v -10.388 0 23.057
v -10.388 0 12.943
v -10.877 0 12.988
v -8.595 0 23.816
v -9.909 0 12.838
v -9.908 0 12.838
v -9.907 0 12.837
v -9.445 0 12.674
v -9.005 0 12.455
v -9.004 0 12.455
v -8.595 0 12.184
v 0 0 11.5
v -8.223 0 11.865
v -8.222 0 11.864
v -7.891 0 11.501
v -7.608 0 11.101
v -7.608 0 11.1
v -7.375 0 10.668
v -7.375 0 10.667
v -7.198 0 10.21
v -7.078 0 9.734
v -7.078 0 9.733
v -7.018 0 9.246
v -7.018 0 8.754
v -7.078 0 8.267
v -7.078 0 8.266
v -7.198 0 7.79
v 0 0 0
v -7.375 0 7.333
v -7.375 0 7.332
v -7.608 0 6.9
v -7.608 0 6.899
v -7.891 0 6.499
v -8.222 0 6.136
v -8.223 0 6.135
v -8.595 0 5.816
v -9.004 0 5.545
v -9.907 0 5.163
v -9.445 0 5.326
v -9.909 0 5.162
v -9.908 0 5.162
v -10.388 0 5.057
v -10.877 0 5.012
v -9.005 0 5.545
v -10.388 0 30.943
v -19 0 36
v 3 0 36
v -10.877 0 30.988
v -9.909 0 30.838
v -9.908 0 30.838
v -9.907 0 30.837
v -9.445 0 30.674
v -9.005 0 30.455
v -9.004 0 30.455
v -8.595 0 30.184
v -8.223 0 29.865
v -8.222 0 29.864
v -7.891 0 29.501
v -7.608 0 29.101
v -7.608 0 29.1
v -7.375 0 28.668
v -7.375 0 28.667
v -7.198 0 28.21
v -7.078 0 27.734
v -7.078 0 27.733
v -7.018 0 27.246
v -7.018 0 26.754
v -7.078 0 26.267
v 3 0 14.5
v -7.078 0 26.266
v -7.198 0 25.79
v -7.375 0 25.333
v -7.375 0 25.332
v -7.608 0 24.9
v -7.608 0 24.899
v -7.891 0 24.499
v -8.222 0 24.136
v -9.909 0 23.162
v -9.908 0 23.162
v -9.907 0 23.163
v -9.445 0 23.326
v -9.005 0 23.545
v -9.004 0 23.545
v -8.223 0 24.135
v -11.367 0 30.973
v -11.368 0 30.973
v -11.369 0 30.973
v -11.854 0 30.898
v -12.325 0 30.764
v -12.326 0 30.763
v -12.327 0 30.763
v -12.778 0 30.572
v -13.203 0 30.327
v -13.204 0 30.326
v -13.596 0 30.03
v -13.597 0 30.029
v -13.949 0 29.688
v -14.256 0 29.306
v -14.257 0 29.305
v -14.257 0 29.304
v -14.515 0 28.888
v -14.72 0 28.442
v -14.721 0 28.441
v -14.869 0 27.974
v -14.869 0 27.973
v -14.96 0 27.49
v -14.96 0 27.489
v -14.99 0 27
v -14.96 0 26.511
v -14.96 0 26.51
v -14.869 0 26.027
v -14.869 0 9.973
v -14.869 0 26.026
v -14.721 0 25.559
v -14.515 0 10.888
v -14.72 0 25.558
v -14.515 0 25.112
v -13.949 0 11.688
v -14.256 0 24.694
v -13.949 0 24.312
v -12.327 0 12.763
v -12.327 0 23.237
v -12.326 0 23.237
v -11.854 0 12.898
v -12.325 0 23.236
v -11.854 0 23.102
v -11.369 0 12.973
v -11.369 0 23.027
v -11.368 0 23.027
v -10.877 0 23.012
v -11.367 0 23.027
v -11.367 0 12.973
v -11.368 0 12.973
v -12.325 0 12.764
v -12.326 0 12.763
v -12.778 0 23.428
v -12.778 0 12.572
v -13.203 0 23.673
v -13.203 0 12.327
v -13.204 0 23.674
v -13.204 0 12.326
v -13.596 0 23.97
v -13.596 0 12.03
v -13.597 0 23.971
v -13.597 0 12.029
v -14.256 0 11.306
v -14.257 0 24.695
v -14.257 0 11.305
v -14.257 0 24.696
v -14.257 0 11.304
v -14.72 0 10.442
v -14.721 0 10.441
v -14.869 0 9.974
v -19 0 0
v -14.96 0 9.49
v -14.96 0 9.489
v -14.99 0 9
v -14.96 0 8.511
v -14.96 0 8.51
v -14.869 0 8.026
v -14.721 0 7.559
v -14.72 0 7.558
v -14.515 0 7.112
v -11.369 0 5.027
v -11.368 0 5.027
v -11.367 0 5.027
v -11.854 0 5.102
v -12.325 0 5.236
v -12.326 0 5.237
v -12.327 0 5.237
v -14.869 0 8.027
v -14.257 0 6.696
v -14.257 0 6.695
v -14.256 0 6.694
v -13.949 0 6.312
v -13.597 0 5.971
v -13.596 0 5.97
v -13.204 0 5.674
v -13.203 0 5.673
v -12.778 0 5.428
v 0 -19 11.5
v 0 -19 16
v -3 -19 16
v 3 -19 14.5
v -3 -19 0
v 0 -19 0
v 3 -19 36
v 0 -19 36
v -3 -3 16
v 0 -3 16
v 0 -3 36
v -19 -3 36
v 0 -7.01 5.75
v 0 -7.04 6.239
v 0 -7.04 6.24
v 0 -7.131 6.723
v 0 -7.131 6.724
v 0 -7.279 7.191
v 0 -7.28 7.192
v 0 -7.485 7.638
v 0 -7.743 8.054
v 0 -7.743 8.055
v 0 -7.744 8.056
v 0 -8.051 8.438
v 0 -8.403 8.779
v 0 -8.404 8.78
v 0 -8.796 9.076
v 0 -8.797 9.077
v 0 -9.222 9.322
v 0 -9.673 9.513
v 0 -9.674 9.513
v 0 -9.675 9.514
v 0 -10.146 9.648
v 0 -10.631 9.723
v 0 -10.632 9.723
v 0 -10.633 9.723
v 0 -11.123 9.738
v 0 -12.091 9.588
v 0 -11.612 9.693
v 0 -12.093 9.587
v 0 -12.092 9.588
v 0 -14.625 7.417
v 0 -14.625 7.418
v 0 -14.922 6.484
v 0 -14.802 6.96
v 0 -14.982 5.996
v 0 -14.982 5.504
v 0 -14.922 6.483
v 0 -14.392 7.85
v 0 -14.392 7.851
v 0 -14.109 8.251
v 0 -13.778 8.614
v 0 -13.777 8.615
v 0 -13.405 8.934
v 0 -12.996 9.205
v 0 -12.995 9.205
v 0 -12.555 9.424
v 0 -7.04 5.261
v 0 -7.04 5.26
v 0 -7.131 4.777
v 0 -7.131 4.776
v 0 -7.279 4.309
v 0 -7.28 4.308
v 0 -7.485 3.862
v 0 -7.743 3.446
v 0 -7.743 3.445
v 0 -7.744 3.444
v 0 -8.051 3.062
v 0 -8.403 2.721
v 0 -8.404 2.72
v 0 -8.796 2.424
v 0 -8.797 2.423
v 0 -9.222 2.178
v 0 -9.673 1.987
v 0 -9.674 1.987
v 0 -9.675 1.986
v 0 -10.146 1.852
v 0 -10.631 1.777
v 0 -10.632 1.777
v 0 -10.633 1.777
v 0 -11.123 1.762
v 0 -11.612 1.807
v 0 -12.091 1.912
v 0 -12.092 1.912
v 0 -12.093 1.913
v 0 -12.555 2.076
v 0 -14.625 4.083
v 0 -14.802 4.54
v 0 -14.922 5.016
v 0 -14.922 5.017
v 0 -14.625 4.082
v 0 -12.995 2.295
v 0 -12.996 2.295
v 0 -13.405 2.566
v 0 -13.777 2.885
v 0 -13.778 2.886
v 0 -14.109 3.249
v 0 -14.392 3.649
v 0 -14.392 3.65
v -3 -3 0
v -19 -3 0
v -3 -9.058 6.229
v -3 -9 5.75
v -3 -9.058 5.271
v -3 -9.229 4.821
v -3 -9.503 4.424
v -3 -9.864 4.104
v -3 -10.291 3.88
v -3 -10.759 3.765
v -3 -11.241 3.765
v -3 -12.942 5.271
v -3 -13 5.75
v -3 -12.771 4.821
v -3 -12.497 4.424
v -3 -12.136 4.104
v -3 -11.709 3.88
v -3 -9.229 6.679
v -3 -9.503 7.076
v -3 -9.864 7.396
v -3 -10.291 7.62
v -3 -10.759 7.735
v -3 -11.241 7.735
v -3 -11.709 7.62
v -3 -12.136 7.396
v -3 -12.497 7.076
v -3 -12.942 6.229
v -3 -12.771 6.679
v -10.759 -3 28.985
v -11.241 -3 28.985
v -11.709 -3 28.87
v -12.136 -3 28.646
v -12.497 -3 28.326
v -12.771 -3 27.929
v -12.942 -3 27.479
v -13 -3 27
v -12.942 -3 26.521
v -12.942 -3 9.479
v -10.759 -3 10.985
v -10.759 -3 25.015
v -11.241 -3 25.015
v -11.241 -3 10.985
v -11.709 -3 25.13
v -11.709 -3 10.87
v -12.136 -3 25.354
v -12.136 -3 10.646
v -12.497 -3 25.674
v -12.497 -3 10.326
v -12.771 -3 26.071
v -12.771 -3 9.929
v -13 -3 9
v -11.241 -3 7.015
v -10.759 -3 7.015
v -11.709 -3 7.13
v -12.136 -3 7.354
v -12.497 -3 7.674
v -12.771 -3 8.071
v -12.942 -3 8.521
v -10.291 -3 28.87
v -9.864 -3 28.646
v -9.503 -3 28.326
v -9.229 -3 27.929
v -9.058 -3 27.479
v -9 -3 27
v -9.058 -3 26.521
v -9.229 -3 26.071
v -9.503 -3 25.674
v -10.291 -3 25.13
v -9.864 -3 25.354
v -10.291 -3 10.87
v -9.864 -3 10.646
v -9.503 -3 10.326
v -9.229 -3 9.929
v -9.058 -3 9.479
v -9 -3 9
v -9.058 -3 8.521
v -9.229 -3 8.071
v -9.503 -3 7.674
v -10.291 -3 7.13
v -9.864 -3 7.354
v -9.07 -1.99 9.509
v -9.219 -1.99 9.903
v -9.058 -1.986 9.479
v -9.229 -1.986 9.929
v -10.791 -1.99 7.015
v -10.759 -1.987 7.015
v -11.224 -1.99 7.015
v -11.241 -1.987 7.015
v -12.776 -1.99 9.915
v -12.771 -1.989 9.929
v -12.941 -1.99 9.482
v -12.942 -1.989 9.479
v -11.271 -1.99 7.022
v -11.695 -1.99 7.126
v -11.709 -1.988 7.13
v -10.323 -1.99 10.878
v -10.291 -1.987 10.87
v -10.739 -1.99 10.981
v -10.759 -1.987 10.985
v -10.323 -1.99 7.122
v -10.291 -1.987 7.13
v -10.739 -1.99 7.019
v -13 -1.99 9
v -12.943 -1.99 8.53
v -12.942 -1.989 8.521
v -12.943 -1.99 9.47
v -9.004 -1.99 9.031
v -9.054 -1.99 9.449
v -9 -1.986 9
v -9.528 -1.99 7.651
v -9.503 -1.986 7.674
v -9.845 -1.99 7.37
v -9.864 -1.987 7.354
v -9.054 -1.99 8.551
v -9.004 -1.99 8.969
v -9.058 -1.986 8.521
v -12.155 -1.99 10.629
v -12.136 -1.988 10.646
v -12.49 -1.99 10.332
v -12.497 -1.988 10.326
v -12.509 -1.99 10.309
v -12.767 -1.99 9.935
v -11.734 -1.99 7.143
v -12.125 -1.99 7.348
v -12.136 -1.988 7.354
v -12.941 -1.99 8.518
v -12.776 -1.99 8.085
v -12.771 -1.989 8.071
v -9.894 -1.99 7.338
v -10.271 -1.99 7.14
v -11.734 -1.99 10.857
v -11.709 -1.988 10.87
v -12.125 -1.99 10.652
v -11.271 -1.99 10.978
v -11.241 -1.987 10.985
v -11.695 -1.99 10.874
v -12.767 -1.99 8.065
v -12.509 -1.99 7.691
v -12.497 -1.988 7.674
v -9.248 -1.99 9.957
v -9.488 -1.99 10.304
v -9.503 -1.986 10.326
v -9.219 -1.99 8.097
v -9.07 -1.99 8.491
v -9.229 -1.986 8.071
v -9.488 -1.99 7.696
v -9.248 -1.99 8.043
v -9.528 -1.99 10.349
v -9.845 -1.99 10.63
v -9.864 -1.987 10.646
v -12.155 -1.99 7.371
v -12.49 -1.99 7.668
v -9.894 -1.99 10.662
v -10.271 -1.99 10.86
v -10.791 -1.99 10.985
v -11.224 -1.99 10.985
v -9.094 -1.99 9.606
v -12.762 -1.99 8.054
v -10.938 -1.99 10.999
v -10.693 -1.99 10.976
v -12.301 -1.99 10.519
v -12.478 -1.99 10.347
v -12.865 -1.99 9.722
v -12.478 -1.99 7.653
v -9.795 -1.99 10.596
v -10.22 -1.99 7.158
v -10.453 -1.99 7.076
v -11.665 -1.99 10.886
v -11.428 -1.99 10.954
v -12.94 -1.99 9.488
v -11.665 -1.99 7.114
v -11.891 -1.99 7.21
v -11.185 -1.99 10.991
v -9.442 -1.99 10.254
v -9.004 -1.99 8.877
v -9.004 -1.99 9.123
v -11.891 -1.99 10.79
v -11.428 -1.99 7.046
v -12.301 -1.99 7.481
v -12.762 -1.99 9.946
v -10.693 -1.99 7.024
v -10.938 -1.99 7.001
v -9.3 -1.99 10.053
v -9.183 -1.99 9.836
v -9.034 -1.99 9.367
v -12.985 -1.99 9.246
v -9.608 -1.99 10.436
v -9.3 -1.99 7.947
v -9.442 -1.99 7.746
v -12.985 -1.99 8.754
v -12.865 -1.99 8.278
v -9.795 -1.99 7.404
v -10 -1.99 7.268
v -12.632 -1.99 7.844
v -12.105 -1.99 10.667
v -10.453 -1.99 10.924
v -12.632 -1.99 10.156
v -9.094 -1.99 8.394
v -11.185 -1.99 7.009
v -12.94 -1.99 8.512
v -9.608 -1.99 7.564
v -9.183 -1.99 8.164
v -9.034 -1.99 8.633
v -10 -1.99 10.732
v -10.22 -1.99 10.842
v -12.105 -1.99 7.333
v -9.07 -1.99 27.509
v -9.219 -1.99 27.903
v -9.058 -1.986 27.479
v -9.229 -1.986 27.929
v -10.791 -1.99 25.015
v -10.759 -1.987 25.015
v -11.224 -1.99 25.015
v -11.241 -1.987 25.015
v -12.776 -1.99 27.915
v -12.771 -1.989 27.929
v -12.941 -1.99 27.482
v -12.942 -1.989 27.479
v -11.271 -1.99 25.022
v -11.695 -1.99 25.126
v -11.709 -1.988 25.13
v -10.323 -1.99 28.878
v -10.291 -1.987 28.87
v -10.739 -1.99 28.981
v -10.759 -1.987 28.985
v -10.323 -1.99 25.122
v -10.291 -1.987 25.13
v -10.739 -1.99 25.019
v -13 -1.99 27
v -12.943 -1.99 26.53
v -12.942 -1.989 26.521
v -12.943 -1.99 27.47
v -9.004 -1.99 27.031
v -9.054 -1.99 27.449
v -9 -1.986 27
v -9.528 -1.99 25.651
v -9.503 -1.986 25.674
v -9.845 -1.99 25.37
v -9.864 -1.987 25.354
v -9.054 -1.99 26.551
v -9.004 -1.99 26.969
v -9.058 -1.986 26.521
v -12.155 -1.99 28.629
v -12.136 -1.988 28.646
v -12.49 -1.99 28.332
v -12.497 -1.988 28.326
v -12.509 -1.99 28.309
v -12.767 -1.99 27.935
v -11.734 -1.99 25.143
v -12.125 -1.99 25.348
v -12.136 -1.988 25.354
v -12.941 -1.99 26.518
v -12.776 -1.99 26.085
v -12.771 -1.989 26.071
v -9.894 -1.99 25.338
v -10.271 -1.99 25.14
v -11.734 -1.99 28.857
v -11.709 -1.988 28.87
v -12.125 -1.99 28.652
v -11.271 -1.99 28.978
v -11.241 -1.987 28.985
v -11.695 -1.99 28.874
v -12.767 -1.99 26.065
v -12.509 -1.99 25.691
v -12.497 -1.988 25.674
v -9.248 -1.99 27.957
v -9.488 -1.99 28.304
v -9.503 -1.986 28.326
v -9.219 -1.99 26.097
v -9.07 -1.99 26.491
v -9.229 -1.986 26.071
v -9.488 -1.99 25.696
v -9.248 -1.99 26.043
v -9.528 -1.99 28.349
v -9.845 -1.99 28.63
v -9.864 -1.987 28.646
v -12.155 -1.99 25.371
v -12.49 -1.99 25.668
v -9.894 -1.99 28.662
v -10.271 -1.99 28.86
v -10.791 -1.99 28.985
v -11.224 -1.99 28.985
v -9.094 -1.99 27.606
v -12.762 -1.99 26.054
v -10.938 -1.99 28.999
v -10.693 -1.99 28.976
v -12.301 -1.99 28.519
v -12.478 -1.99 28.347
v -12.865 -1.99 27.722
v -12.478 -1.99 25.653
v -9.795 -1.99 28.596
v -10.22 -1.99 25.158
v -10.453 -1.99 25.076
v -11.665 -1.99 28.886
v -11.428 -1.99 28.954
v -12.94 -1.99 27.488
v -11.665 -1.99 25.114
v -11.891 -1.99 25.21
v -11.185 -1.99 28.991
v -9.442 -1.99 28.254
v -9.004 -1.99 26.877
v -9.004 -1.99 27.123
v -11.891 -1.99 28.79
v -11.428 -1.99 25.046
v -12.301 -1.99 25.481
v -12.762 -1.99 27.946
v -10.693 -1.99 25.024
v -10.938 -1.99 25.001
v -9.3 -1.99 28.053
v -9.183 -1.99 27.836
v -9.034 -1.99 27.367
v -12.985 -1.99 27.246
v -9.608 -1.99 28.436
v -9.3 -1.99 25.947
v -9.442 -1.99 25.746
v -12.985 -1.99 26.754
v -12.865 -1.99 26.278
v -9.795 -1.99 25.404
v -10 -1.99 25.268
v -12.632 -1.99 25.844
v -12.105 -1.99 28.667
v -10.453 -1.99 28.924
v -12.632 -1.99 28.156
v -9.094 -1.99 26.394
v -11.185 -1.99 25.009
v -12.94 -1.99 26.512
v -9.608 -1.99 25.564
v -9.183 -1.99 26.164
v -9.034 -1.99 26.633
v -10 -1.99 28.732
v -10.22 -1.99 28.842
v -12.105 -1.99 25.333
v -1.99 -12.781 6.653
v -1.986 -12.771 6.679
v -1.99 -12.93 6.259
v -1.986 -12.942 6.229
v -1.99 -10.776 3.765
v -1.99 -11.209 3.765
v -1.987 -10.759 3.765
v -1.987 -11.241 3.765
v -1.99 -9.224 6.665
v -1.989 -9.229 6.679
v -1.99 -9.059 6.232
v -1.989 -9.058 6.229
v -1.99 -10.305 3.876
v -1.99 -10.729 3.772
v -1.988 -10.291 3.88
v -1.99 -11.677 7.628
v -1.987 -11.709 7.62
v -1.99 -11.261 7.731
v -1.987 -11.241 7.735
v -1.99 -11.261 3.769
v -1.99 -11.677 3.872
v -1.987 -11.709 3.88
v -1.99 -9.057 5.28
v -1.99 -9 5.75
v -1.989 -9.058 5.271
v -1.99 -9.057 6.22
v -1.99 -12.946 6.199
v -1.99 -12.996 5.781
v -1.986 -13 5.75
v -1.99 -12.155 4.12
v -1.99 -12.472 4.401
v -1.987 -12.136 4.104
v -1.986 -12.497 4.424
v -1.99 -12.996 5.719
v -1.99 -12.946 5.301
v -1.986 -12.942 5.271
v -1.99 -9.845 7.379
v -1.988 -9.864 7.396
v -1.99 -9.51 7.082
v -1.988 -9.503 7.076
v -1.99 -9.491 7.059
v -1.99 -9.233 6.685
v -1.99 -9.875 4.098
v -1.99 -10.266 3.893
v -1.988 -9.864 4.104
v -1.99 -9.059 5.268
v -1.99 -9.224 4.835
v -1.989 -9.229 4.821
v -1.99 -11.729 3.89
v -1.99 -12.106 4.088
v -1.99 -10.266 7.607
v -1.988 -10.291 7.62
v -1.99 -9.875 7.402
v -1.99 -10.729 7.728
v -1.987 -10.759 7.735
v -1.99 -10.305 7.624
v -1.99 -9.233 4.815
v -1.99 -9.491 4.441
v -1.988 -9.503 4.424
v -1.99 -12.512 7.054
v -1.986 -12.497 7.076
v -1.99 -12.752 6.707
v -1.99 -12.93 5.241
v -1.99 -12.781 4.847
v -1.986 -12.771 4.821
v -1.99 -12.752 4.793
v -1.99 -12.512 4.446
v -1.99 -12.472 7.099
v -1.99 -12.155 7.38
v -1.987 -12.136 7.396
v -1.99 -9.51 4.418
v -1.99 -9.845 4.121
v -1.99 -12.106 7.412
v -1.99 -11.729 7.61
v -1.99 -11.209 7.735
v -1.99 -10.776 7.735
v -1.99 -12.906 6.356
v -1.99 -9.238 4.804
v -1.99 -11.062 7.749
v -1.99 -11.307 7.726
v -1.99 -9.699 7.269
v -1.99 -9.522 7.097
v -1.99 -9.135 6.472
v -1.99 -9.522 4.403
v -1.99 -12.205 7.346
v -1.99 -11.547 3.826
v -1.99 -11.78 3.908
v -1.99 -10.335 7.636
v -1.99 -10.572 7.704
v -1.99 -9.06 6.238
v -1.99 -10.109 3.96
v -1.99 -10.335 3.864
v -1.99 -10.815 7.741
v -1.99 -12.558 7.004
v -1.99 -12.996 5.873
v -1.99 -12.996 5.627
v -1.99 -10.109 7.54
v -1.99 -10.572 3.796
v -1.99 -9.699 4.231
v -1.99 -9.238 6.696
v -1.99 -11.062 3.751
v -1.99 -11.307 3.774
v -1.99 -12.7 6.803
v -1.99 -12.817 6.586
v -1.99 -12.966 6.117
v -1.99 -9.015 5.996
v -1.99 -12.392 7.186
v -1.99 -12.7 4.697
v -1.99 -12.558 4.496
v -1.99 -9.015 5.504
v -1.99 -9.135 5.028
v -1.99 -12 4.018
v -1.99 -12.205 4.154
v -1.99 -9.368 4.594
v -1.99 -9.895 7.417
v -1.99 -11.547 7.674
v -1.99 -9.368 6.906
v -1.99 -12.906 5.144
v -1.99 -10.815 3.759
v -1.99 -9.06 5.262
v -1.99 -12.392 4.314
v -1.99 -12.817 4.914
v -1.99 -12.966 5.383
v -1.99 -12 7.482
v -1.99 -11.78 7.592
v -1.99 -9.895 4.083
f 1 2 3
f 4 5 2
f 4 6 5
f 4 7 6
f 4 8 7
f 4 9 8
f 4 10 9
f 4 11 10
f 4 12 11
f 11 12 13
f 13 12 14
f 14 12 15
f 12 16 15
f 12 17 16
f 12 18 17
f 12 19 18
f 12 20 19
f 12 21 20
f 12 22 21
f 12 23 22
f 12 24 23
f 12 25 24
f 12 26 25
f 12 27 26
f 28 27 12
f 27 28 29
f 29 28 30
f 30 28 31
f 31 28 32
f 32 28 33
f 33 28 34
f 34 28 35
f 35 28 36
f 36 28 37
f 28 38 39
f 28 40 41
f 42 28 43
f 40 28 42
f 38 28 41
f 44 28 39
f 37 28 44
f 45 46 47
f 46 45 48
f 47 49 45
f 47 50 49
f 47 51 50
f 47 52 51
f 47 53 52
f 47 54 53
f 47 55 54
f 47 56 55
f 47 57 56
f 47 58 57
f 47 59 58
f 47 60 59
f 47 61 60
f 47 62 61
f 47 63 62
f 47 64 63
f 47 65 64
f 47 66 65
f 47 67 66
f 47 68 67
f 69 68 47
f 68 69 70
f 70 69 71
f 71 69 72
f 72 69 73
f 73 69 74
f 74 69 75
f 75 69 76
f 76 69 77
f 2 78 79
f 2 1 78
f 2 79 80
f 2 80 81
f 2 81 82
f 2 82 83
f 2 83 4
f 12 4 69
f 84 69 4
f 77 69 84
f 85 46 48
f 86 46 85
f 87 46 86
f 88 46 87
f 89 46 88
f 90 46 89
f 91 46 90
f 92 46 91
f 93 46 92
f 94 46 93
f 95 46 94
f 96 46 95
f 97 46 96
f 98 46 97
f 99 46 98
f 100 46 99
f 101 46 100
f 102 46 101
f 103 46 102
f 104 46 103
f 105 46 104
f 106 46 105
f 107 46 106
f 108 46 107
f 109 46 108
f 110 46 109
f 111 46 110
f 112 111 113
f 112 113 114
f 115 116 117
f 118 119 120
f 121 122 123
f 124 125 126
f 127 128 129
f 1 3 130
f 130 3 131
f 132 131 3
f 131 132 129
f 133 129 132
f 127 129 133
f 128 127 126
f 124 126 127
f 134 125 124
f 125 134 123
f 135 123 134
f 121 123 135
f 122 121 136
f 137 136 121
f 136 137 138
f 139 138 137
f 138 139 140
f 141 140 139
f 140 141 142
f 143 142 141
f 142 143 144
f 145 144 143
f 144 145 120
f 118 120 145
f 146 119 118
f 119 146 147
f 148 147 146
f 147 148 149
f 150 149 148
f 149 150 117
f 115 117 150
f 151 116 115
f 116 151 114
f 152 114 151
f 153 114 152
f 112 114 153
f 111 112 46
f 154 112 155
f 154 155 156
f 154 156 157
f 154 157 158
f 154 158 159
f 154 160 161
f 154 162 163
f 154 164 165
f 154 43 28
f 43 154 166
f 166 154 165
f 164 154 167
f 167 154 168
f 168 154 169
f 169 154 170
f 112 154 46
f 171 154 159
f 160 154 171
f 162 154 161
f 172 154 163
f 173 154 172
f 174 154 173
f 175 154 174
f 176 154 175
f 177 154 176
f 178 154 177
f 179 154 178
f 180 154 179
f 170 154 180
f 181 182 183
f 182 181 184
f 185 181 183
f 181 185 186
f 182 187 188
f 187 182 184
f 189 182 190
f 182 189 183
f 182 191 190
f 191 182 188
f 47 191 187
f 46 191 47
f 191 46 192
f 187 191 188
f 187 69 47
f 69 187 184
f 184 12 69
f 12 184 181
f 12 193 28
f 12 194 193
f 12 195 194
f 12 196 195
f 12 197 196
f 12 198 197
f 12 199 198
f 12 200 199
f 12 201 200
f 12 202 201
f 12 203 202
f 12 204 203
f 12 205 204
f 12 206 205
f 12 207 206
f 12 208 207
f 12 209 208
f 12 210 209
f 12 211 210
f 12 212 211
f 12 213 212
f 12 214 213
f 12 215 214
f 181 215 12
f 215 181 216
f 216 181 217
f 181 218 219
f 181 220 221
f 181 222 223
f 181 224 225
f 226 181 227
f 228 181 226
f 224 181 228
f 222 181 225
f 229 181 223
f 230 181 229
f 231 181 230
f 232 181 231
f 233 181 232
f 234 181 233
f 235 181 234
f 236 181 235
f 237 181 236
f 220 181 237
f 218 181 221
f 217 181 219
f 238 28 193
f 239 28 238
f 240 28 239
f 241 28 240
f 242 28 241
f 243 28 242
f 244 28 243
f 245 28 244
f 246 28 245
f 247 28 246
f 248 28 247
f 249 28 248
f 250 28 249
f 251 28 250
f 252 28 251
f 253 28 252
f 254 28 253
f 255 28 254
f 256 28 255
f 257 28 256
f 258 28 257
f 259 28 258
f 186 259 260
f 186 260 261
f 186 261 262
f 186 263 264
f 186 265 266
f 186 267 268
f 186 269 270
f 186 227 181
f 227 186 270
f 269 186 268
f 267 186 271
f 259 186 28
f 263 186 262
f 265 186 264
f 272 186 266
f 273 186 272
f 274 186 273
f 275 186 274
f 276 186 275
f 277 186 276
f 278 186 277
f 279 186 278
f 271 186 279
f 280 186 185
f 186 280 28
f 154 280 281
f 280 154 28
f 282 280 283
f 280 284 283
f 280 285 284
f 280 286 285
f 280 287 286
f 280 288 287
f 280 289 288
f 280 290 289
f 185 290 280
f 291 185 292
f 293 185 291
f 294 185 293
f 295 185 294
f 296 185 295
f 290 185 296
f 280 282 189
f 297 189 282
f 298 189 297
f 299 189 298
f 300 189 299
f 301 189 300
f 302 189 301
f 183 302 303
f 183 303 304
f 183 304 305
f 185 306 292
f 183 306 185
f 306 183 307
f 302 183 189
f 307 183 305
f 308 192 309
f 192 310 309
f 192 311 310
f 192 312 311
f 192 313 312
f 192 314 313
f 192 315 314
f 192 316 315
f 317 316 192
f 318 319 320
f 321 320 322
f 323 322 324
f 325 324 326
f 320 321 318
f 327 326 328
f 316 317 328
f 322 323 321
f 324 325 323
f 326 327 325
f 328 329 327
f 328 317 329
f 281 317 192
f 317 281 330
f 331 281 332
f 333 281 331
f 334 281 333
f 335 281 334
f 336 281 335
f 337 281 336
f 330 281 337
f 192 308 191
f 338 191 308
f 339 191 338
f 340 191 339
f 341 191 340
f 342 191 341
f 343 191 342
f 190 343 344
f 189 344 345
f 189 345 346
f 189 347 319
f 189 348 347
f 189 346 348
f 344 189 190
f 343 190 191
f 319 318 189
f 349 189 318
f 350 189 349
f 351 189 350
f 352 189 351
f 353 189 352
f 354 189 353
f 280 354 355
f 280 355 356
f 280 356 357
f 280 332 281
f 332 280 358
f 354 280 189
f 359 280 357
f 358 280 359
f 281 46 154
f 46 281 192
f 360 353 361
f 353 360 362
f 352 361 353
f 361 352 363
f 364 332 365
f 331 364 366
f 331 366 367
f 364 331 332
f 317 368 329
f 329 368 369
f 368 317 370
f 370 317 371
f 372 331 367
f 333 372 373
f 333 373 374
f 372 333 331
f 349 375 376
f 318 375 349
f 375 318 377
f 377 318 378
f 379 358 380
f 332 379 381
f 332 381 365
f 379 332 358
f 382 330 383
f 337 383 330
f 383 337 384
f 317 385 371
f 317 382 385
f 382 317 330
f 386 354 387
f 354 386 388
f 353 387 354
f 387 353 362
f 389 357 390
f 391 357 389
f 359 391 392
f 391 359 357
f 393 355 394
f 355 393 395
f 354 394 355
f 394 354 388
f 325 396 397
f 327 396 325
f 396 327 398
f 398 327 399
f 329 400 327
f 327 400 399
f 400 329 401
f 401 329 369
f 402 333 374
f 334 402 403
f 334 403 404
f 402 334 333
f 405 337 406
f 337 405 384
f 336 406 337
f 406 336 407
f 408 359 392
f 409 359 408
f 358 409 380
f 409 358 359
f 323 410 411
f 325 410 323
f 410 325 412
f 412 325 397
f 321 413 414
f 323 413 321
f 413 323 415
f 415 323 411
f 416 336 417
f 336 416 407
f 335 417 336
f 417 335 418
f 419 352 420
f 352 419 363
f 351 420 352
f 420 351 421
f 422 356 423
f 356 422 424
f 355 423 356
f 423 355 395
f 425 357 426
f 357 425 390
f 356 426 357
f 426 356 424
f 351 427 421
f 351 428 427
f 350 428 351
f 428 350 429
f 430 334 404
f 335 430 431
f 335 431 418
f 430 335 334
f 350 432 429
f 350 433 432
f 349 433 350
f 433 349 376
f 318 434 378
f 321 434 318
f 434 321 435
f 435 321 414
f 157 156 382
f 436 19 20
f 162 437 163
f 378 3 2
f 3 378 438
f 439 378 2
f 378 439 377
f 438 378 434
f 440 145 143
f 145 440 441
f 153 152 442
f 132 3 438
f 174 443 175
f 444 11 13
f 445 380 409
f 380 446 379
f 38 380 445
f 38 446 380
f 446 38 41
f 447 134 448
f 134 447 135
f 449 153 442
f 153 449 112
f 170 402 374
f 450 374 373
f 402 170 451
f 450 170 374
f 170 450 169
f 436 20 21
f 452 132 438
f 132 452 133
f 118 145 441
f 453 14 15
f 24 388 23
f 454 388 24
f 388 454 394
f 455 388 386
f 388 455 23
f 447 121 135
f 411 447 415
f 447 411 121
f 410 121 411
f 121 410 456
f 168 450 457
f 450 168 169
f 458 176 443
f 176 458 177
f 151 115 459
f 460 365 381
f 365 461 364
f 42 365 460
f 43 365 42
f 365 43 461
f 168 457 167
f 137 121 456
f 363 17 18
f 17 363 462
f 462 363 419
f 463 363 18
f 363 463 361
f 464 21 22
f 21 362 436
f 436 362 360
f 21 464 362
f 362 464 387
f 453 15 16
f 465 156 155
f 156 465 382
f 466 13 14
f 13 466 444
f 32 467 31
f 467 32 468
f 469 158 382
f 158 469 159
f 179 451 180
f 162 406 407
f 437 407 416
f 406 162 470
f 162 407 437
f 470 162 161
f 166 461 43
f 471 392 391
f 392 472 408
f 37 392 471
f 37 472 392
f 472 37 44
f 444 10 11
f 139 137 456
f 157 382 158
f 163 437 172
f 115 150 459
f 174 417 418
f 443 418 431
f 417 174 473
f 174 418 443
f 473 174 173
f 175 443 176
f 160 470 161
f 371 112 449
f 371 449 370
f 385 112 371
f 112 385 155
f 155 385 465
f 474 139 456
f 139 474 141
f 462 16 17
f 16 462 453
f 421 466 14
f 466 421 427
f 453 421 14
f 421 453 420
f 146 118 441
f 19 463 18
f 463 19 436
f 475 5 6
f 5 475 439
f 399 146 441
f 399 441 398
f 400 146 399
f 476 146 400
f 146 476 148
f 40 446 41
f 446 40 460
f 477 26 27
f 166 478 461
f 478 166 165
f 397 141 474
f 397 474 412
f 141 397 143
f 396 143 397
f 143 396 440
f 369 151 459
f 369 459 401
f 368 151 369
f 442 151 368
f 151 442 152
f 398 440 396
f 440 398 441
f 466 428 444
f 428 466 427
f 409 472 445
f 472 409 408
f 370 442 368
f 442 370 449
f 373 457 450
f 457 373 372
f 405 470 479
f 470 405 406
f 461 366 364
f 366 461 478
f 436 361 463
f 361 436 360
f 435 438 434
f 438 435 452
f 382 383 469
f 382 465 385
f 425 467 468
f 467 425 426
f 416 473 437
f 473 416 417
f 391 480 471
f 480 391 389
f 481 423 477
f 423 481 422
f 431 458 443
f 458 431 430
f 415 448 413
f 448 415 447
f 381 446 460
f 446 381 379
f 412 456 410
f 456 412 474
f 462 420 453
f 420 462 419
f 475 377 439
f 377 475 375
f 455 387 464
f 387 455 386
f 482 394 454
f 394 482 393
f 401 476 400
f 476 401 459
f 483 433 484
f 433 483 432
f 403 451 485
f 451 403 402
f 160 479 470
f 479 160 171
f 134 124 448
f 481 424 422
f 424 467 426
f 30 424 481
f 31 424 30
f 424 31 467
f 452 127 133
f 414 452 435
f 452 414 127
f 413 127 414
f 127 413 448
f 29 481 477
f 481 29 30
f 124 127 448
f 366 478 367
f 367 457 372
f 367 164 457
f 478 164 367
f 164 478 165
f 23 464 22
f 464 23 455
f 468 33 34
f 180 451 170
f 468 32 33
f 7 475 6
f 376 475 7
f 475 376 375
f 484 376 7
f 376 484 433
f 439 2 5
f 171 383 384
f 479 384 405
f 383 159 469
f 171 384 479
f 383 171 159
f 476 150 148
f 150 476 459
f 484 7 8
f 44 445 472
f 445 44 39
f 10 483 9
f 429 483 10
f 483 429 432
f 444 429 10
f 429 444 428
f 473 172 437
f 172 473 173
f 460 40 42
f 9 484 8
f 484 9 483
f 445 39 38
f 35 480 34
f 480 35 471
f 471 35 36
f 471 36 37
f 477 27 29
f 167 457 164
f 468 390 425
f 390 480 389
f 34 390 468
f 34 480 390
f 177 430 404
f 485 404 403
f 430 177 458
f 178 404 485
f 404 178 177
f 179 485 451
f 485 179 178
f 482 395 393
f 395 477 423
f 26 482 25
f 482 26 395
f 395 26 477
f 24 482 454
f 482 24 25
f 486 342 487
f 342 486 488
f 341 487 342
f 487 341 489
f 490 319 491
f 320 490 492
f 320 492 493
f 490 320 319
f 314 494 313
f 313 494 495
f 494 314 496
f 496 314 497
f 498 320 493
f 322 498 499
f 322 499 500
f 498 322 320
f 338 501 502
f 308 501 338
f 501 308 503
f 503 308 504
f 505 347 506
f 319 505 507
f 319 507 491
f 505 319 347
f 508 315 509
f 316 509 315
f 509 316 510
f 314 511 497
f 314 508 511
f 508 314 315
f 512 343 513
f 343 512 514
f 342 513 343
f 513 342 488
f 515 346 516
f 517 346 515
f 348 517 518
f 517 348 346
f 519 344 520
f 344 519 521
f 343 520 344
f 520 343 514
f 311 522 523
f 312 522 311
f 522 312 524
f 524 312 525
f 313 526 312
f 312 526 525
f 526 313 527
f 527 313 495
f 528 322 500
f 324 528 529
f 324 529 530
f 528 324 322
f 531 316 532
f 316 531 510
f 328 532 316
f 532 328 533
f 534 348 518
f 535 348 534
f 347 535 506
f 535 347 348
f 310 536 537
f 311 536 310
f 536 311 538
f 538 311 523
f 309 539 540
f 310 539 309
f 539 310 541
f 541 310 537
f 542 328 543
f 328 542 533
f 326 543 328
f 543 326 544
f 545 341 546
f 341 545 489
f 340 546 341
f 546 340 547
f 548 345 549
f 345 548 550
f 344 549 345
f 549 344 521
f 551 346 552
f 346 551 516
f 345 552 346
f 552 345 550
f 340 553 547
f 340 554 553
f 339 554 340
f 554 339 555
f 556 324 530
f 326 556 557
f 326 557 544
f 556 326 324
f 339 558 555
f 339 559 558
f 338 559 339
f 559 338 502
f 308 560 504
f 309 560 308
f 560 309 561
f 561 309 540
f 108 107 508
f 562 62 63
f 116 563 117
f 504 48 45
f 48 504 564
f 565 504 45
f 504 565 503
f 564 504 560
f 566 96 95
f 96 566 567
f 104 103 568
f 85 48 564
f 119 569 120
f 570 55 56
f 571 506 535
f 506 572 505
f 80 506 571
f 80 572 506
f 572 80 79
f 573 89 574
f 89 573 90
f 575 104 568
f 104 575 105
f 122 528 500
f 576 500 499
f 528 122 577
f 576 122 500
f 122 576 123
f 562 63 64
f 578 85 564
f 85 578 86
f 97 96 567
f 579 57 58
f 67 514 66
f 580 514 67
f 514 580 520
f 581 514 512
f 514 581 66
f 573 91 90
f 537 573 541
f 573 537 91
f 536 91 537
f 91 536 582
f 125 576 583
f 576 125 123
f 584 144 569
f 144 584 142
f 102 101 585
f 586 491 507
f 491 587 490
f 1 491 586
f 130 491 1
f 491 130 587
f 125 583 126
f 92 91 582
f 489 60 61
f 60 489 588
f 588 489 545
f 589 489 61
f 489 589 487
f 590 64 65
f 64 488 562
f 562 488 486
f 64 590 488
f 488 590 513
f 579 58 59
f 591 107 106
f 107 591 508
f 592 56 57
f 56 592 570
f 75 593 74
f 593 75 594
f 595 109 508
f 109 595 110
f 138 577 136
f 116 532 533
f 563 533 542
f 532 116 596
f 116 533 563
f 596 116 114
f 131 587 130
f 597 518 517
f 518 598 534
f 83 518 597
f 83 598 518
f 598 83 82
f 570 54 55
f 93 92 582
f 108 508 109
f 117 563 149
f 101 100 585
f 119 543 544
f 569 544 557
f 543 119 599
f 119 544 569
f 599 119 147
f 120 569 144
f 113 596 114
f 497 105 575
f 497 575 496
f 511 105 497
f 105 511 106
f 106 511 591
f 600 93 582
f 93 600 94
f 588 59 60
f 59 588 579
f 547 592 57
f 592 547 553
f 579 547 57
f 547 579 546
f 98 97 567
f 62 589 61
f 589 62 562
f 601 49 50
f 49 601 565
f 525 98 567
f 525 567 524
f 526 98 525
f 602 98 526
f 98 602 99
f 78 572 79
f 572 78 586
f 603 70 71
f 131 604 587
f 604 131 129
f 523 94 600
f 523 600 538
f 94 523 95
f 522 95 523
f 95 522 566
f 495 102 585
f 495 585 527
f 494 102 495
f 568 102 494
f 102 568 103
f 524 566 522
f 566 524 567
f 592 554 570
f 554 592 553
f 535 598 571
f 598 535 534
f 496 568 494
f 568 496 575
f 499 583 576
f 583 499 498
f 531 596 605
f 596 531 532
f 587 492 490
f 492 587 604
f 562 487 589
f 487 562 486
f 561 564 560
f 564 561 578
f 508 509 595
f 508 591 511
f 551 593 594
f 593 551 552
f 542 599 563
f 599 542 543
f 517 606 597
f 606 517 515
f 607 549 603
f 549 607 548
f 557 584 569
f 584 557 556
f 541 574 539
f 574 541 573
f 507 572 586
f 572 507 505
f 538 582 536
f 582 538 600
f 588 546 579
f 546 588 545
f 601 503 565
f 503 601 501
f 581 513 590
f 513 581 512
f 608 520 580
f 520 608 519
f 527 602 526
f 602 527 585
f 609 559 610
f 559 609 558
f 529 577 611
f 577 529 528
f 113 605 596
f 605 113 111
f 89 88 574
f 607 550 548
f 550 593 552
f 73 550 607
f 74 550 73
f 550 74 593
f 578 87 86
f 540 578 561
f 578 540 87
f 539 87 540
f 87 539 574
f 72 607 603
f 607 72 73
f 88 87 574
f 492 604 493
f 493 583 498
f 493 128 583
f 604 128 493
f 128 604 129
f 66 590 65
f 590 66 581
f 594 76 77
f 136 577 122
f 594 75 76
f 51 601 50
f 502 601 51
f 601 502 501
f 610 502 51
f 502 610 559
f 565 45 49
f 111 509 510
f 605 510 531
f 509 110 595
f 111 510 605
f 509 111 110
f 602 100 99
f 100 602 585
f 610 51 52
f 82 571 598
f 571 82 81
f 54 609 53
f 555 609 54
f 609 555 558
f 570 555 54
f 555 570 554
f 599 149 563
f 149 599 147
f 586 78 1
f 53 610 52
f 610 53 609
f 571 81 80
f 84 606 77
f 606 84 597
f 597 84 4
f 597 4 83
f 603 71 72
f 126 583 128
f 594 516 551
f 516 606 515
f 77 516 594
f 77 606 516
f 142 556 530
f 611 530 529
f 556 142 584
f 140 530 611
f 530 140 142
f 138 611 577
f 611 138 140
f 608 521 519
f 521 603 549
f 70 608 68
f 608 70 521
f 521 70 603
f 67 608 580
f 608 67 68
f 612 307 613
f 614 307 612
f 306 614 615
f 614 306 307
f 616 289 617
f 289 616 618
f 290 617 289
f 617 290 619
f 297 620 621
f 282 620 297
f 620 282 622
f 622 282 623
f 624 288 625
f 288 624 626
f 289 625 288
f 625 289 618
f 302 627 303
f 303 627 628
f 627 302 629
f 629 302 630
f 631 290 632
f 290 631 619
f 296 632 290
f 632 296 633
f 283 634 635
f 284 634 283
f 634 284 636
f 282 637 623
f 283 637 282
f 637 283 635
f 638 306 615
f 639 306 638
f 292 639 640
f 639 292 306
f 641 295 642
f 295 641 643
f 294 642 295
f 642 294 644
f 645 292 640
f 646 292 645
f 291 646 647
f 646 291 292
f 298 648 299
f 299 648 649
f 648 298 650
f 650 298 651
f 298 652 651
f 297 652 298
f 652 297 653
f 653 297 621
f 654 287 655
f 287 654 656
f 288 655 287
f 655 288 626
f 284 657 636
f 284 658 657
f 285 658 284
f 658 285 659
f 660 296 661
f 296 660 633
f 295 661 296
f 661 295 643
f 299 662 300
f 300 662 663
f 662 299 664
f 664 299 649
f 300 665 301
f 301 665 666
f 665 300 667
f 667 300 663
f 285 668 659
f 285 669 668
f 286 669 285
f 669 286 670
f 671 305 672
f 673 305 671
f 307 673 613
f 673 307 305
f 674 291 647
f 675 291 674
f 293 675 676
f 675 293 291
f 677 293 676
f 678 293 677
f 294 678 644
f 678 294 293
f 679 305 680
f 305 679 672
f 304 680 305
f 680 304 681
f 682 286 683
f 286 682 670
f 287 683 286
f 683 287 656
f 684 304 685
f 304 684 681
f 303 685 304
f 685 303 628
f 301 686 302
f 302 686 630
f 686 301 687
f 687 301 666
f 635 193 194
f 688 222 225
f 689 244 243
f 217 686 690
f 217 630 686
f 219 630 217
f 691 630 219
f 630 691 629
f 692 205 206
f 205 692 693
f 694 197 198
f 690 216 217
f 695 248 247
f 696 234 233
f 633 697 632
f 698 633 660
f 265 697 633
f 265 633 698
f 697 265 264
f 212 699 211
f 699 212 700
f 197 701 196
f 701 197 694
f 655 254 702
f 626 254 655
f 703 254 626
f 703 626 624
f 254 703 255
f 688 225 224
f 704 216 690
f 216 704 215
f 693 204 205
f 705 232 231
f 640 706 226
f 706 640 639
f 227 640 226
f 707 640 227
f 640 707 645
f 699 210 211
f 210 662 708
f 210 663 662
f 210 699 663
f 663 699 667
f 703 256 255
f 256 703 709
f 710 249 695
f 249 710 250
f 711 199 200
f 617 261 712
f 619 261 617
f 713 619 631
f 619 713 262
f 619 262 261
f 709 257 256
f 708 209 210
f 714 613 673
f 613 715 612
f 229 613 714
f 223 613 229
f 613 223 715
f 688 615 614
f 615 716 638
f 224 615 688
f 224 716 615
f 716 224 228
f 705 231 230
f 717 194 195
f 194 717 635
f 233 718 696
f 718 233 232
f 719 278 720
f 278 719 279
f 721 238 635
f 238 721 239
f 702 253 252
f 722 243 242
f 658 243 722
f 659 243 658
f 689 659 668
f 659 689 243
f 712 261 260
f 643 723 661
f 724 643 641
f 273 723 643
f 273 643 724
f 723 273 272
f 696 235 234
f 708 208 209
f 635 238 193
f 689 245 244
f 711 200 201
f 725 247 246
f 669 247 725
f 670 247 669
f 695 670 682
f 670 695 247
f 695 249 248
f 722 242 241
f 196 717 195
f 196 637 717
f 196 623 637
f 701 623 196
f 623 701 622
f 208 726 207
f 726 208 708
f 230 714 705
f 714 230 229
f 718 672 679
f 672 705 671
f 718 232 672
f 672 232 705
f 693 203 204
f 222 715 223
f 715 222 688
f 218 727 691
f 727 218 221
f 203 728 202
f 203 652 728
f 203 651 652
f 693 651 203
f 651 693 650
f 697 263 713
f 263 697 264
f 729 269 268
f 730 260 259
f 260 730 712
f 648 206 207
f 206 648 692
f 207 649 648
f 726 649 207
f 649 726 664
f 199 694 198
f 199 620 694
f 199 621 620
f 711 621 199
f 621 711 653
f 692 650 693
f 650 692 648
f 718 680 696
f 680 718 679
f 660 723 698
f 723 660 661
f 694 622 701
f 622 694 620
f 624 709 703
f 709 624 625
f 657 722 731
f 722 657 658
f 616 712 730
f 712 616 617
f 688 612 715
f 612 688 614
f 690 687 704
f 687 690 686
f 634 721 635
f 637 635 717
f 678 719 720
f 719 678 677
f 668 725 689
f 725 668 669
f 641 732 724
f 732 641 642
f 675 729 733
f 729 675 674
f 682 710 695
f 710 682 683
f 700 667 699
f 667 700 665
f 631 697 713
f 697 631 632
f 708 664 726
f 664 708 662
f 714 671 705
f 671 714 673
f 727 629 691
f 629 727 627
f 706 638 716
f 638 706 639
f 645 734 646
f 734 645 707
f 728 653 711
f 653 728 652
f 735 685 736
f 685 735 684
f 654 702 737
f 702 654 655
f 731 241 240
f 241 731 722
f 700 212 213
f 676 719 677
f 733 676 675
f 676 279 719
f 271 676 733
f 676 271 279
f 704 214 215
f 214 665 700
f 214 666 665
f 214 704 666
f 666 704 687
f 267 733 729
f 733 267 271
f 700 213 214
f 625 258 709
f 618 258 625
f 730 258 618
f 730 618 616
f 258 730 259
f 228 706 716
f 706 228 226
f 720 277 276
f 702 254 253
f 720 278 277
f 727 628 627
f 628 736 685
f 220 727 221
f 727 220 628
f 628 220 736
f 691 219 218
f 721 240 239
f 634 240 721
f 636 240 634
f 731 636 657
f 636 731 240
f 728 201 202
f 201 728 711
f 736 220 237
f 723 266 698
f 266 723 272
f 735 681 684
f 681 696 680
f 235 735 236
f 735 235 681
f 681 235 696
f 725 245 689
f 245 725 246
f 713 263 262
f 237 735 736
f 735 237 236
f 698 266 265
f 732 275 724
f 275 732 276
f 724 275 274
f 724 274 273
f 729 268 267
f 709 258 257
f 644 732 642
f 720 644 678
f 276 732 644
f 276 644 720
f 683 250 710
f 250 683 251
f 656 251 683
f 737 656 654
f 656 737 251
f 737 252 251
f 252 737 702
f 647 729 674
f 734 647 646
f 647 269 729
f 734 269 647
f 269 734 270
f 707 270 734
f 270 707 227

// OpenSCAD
bissl=1/100;
$fa=1/1;
$fs=1/2;
thickness=3;
wall=3;
screw=4;
width=16;
upper_length=20;
lower_length=7;
guide_length=32;
part="upper-left";//[upper-left,upper-right,lower-left,lower-right,guide]

module bohrung(screw,wall) {
translate([0,0,-bissl]) cylinder(d=screw,h=wall+2*bissl);
translate([0,0,-bissl]) cylinder(d1=2*screw,d2=screw,h=screw/2);
}

module endcorner(thickness,wall,screw,width,length) {
  difference() {
    union() {
      linear_extrude(height=width+wall,convexity=2)polygon([[0,0],[wall,0],[wall,width],[wall-thickness,width],[wall-thickness,width+length],[-thickness,width+length],[-thickness,width-0.5*thickness],[0,width-1.5*thickness]]);
      linear_extrude(height=wall,convexity=2)polygon([[0,0],[wall+width,0],[wall+width,width+length],[-thickness,width+length],[-thickness,width-0.5*thickness],[0,width-1.5*thickness]]);
    }
    translate([wall+width/2,(width+length)*0.25,0])bohrung(screw=screw,wall=wall);
    translate([wall+width/2,(width+length)*0.75,0])bohrung(screw=screw,wall=wall);
    translate([0,0.5*width-0.75*thickness,width/2+wall])rotate([0,90,0])bohrung(screw=screw,wall=wall);
  }
}

module guide(wall,width,length,screw,offset) {
  difference() {
    union() {
      cube([wall,width+wall,guide_length]);
      cube([width+wall+offset,wall,guide_length]);
    }
    translate([wall+width/2+offset,0,guide_length-width/2])rotate([-90,0,0])bohrung(screw=screw,wall=wall);
    translate([wall+width/2+offset,0,width/2])rotate([-90,0,0])bohrung(screw=screw,wall=wall);
  }
}

if (part=="upper-right") rotate([90,0,0]) endcorner(thickness=thickness,wall=wall,screw=screw,width=width,length=upper_length);
if (part=="upper-left") mirror([1,0,0]) rotate([90,0,0]) endcorner(thickness=thickness,wall=wall,screw=screw,width=width,length=upper_length);
if (part=="lower-left") rotate([90,0,0]) endcorner(thickness=thickness,wall=wall,screw=screw,width=width,length=lower_length);
if (part=="lower-right") mirror([1,0,0]) rotate([90,0,0]) endcorner(thickness=thickness,wall=wall,screw=screw,width=width,length=lower_length);
if (part=="guide") guide(wall=wall,width=width,length=guide_length,screw=screw,offset=thickness+wall);
